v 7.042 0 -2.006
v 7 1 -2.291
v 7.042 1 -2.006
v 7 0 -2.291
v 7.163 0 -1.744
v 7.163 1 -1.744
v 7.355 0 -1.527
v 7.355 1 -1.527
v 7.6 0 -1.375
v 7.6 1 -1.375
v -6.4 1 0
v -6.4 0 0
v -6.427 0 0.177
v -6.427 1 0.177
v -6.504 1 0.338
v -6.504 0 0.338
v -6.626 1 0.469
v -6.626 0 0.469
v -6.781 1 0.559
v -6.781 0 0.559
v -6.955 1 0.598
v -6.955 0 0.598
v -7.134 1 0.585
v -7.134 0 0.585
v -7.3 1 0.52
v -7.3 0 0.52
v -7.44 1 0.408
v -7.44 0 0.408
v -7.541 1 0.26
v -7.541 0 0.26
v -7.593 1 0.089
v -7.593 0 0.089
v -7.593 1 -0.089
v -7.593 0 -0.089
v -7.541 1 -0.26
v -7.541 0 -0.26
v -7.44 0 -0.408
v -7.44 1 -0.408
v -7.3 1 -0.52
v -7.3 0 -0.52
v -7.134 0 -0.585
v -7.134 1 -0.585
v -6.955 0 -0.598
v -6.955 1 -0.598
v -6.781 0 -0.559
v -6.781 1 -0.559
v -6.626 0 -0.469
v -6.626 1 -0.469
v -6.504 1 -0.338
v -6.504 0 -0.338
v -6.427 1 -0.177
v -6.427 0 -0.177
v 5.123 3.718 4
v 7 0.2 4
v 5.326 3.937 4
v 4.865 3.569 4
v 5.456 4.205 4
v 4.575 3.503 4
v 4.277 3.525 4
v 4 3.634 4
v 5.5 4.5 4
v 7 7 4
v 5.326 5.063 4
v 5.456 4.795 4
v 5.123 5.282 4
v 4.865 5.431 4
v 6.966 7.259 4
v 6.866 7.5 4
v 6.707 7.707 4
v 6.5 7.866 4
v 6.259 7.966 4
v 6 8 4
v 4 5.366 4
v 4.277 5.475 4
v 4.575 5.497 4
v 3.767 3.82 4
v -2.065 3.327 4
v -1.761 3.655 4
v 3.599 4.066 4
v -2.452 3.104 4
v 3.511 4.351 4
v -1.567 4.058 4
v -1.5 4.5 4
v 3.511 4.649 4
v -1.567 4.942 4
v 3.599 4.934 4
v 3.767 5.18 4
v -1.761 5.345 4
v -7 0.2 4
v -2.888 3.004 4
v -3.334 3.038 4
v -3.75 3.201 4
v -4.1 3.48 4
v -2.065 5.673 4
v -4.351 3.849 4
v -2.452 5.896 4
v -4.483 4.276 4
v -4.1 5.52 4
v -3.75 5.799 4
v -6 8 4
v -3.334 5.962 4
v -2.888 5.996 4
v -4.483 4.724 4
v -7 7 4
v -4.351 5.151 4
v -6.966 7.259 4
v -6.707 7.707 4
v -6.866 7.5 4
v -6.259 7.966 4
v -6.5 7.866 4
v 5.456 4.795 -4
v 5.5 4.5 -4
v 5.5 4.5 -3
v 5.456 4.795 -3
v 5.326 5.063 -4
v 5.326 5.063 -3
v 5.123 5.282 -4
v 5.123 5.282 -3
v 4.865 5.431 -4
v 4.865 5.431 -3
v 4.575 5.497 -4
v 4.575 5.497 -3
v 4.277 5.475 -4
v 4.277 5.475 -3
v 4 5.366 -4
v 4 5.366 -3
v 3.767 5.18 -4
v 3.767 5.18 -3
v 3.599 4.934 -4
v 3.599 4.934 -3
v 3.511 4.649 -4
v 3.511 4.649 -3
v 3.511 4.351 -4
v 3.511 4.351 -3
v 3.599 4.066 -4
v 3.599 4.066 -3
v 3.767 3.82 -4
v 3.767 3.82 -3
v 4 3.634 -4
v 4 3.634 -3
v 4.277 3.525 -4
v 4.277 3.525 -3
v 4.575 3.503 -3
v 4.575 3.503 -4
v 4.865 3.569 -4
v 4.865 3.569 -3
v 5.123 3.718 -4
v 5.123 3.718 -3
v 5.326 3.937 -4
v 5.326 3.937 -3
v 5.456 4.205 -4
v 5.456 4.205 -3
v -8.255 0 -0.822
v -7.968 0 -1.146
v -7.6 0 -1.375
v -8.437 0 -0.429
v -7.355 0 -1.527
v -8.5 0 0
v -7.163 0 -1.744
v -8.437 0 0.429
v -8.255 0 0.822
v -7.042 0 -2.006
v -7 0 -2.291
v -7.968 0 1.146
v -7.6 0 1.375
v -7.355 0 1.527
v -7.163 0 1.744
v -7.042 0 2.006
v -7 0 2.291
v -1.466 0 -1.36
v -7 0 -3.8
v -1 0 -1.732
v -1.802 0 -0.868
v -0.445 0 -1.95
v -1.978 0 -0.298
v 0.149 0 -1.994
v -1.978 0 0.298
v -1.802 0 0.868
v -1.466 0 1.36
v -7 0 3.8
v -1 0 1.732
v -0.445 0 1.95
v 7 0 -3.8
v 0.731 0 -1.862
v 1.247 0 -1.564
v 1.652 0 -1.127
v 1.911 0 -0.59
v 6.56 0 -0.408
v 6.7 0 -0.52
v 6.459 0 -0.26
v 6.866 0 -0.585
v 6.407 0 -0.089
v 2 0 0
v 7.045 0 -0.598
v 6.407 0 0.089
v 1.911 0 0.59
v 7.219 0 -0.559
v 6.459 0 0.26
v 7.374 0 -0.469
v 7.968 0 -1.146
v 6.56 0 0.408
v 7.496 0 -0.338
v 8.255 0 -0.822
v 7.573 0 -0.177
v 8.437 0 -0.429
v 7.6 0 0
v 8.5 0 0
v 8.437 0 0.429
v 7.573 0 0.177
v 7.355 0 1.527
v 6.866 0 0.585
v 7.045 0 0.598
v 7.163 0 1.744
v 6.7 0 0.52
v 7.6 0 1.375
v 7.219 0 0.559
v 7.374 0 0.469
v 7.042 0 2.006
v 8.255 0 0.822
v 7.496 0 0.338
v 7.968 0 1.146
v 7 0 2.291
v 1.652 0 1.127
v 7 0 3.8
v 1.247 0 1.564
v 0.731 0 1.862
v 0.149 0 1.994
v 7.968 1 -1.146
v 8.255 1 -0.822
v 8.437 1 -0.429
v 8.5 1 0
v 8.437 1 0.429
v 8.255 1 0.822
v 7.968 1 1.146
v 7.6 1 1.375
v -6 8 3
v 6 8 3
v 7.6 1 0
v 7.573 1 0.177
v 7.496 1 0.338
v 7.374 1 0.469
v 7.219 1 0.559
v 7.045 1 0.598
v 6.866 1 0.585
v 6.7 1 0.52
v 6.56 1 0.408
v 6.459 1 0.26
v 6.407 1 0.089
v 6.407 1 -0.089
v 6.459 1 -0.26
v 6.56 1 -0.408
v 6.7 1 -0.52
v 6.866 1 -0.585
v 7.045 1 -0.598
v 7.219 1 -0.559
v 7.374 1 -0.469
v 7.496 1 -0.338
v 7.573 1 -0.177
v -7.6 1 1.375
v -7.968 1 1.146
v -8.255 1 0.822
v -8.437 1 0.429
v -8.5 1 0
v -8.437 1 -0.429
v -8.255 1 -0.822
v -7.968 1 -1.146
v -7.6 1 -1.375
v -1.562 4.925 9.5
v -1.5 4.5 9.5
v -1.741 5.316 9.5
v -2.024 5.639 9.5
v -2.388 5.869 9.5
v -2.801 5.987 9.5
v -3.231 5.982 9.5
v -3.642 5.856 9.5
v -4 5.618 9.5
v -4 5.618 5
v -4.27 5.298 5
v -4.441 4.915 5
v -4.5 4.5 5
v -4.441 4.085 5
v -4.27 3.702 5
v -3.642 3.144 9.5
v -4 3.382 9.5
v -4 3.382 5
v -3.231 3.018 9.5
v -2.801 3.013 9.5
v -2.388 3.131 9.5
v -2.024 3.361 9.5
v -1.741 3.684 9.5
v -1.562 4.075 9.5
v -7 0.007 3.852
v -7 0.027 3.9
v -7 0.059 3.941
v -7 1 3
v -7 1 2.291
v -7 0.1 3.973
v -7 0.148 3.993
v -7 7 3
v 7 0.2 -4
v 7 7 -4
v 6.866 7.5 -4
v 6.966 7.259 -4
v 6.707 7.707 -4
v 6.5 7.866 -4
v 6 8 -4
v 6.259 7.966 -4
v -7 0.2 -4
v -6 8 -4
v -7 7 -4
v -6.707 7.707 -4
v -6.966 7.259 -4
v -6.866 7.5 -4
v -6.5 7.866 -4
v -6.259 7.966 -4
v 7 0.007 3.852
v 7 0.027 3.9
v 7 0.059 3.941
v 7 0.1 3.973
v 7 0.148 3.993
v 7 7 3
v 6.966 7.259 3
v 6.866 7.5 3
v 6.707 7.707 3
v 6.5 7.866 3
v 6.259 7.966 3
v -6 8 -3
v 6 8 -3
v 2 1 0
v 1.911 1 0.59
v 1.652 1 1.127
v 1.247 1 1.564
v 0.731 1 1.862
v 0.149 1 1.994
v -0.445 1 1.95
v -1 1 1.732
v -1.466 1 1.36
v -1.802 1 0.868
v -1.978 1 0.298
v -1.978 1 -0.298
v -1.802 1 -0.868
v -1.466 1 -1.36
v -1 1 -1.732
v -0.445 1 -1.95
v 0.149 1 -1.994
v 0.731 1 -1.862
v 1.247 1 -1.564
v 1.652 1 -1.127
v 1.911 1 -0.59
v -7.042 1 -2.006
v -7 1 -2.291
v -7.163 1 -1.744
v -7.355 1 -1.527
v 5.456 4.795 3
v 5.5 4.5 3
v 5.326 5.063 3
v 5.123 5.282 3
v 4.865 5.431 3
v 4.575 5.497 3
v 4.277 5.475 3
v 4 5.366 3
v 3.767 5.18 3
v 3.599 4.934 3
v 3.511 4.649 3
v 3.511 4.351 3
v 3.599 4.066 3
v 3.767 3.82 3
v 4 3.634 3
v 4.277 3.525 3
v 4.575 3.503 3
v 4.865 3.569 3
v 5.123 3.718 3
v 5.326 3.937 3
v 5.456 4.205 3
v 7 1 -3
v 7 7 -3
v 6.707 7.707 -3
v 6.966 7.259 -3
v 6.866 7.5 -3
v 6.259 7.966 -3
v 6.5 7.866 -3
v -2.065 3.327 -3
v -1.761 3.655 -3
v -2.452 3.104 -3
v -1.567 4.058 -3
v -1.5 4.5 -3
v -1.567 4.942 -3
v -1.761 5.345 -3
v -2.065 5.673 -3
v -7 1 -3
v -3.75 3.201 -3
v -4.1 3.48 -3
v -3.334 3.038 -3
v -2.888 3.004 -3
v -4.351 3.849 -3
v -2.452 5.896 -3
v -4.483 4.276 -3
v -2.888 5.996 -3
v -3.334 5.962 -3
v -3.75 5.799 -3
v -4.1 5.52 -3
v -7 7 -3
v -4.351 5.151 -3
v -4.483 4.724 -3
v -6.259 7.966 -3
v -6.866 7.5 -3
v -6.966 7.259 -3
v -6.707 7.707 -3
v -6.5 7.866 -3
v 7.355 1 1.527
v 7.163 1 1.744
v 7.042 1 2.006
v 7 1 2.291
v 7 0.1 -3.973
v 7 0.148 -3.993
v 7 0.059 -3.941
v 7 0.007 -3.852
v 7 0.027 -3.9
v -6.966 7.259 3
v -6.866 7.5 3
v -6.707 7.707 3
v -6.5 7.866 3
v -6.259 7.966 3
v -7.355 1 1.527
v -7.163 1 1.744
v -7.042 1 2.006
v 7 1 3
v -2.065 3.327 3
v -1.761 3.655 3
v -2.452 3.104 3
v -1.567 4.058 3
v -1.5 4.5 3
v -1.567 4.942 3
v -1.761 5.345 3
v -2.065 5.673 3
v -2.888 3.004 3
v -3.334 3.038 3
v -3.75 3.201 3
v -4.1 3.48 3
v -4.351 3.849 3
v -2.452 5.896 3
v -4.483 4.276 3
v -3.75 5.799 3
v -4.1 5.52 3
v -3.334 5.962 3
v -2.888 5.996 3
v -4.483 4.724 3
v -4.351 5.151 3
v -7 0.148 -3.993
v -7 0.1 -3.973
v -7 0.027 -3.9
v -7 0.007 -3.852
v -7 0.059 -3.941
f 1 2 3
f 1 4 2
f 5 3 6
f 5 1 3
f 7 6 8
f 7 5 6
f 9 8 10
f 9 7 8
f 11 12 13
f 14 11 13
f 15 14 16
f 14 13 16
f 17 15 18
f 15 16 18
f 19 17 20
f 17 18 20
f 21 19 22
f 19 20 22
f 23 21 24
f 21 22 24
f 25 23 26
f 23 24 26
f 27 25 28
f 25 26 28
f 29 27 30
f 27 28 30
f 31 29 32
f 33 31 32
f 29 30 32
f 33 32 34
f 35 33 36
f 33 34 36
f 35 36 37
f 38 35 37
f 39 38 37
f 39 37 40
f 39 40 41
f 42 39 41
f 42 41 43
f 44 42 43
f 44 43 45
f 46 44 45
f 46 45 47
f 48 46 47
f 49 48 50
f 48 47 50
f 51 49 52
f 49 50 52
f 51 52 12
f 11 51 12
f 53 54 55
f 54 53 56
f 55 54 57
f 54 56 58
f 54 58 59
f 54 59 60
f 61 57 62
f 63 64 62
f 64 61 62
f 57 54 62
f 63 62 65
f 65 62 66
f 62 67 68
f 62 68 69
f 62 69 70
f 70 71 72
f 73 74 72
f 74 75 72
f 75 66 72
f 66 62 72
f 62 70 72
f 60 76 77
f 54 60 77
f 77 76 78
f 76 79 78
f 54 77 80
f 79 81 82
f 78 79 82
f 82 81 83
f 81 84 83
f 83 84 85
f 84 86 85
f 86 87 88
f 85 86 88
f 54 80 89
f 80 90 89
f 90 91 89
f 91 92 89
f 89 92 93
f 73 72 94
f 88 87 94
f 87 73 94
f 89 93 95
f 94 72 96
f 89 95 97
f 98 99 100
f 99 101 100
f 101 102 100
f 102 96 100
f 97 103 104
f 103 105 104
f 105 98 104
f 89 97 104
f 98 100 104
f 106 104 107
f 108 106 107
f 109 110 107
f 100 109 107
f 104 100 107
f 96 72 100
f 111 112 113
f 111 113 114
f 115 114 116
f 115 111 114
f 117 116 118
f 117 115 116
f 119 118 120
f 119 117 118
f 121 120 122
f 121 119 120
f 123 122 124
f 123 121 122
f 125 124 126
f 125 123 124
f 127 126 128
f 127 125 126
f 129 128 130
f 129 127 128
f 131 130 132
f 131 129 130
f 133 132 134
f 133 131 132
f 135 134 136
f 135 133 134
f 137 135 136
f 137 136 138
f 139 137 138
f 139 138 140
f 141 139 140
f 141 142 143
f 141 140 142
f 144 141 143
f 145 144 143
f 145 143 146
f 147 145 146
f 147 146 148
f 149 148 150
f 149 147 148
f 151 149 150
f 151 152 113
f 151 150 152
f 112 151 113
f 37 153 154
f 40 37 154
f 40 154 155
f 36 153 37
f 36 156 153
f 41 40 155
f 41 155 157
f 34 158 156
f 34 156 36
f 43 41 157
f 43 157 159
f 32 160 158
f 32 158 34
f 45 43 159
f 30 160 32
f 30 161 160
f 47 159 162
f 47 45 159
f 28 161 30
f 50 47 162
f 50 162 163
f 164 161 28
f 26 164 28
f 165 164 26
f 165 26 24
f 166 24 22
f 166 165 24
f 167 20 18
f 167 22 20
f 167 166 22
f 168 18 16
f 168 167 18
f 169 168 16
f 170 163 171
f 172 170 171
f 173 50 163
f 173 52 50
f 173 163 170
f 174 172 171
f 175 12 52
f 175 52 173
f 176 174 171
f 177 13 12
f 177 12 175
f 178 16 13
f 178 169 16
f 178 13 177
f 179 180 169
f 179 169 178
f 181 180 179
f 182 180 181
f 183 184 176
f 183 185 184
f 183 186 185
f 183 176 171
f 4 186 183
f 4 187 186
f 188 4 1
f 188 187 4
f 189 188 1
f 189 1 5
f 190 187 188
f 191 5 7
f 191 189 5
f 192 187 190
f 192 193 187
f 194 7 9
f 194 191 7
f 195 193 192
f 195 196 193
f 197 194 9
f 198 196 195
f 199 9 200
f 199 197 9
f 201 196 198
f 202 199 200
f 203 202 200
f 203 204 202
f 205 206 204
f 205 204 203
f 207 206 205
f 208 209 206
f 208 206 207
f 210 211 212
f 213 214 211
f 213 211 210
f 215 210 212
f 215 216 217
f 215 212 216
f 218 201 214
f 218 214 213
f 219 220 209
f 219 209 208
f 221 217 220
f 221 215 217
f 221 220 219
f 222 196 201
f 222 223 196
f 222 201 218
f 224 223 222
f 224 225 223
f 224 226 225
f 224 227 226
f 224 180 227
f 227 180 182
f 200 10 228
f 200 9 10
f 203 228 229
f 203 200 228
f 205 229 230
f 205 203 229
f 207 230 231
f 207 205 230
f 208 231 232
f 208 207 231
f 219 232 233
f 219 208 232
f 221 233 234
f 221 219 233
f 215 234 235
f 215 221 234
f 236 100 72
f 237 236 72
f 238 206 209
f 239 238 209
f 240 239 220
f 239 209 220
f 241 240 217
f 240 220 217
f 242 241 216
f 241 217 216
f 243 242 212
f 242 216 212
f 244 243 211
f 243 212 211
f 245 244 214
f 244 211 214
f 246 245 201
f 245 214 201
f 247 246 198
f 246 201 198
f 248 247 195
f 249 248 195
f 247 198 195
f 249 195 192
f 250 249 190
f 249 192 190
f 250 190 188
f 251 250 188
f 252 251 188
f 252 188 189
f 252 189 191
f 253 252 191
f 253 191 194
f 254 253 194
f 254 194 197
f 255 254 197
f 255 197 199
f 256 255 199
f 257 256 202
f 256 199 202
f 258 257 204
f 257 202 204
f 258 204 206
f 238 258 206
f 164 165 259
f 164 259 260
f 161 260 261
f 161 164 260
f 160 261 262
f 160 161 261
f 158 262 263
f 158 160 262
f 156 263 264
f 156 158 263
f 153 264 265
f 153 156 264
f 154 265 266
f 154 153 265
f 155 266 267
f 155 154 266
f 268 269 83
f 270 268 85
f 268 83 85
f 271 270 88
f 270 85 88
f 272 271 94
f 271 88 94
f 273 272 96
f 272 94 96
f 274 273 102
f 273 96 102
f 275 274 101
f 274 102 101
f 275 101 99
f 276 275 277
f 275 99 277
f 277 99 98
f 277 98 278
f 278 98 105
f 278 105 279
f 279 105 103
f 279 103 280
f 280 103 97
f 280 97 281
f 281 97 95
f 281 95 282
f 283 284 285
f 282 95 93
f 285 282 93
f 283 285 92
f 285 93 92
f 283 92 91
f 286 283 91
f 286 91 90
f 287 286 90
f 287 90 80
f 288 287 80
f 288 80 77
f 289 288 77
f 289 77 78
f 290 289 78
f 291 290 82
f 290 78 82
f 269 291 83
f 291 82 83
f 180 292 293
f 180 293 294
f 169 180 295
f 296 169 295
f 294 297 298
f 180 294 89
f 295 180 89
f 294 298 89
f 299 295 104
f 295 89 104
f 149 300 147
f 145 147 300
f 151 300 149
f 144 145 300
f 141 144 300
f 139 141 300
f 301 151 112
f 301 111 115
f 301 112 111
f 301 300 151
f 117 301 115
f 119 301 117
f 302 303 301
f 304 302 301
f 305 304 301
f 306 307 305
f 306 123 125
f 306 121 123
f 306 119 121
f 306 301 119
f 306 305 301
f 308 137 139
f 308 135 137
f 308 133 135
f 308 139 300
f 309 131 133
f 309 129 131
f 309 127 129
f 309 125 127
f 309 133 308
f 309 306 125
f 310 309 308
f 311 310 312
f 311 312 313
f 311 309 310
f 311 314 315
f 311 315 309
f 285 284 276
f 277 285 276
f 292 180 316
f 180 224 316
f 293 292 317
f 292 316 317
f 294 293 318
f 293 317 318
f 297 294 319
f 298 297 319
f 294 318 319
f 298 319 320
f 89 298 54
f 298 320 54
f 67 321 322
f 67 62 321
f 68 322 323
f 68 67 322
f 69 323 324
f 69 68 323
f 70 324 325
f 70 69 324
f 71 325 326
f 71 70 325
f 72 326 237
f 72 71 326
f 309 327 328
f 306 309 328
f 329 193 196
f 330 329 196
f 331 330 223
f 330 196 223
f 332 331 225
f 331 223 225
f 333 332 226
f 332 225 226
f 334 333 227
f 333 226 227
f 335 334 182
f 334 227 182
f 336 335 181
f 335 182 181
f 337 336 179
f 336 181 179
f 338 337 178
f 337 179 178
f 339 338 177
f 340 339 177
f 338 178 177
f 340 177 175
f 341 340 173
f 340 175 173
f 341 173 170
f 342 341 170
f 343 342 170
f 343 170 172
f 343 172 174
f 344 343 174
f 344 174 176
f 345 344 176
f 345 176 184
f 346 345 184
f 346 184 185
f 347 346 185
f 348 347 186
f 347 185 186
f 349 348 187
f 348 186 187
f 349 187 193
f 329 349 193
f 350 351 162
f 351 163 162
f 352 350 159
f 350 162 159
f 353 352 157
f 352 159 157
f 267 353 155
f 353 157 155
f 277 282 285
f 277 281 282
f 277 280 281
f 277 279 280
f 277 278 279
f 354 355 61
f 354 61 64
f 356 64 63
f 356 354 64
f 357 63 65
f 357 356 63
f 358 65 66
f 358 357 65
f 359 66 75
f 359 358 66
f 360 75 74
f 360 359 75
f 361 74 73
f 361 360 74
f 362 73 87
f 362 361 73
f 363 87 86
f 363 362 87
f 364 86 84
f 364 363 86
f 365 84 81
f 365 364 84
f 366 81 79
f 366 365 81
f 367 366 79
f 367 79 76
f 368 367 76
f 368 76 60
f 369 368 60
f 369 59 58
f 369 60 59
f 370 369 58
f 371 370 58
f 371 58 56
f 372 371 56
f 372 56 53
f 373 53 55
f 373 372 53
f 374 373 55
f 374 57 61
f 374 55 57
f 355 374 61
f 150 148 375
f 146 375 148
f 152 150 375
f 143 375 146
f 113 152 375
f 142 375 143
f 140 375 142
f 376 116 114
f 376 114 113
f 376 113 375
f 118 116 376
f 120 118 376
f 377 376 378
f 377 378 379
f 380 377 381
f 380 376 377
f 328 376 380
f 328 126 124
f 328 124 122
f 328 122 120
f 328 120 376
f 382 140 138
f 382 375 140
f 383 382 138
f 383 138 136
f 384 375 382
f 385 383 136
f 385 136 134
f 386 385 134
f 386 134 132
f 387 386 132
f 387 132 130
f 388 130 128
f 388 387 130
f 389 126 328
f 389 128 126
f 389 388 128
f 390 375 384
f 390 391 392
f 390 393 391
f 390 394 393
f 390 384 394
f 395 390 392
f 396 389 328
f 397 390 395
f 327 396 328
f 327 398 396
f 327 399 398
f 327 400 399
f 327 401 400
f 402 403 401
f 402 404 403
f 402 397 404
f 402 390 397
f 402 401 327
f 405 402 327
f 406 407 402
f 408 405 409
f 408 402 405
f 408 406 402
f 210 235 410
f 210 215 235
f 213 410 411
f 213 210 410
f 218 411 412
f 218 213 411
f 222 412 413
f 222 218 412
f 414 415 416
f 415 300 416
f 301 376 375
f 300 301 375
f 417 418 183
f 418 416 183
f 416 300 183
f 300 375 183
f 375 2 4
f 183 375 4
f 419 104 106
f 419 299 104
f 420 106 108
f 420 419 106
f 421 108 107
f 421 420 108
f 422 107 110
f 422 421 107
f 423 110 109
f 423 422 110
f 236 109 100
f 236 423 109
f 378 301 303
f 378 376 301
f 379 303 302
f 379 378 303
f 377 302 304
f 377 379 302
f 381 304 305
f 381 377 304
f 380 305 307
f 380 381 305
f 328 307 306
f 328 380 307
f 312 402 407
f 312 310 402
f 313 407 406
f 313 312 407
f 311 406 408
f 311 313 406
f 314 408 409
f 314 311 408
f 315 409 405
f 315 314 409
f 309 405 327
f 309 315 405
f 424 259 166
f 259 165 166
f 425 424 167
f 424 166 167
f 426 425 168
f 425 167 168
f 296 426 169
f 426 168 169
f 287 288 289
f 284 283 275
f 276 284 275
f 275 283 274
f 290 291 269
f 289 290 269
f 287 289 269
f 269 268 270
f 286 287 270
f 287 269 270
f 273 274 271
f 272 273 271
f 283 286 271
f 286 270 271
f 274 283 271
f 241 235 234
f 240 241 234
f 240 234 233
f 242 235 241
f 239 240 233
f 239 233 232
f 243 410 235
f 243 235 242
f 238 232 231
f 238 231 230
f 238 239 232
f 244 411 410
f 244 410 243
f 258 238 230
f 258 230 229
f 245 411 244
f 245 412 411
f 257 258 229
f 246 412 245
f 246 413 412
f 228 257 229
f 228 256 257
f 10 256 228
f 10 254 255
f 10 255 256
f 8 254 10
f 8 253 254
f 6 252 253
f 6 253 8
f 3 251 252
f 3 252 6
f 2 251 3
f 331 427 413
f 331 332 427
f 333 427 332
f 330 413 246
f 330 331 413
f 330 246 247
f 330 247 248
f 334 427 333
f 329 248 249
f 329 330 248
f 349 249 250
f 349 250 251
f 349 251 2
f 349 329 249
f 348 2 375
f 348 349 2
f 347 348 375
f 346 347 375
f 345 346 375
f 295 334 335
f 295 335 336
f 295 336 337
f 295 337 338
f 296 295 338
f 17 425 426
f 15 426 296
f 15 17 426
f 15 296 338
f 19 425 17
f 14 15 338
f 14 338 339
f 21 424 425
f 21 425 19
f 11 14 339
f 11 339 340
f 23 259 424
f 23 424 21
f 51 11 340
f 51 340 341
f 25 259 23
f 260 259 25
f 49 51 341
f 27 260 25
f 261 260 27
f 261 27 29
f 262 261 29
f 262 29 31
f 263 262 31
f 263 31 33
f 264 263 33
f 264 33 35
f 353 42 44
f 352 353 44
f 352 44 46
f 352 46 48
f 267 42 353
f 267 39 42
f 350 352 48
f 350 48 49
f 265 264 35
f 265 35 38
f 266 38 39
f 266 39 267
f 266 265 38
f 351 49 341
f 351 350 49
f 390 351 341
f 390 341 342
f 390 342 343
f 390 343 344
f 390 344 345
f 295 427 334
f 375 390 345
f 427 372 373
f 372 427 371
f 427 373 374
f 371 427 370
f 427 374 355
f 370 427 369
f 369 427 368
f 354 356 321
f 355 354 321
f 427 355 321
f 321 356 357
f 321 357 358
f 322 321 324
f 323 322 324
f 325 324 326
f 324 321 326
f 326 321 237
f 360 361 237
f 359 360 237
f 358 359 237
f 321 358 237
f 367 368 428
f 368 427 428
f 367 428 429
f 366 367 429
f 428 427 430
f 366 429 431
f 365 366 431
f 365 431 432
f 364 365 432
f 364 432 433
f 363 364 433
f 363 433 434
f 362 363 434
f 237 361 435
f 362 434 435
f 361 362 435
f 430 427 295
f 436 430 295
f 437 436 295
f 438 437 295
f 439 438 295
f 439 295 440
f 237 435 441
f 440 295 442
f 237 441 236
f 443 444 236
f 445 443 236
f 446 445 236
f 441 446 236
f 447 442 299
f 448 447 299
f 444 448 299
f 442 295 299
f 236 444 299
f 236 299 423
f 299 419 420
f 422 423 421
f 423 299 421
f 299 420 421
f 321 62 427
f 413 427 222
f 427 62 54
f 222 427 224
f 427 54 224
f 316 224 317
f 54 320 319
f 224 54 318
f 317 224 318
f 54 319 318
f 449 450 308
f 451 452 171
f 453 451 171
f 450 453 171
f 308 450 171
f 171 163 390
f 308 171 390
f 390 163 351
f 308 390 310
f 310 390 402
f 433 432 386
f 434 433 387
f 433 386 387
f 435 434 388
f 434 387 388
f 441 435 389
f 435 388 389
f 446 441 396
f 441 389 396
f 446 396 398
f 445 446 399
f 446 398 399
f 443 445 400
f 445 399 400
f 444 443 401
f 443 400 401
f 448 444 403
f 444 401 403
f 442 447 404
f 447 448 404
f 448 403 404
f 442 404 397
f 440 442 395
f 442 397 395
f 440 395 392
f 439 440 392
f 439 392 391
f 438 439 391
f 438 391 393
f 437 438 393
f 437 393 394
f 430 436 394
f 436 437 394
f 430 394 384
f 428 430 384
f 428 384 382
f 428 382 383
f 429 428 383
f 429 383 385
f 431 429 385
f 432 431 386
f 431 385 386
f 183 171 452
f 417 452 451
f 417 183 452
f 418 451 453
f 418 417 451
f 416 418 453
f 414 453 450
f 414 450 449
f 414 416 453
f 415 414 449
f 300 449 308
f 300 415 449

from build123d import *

# Parameters (mm, degrees)
EXTRUDE1_DEPTH      = 4
EXTRUDE2_DEPTH      = 12.357816692
EXTRUDE2_DEPTH_BACK = 12.357816692
SKETCH2_R           = 1
EXTRUDE3_DEPTH      = 12.357816692
EXTRUDE3_DEPTH_BACK = 12.357816692
SKETCH4_W           = 6
SKETCH4_H           = 8.732029078
FILLET1_R           = 0.2
FILLET2_R           = 1
EXTRUDE4_DEPTH      = 14
EXTRUDE4_DEPTH_BACK = 3
SKETCH3_R           = 1.5
EXTRUDE5_DEPTH      = 9
SKETCH6_R           = 1.5
EXTRUDE6_DEPTH      = 1
SKETCH7_R           = 0.6
EXTRUDE7_DEPTH      = 1
FILLET3_R           = 1
SKETCH8_R           = 2
EXTRUDE8_DEPTH      = 1
SKETCH9_W           = 5.922368331
SKETCH9_H           = 2.817570744
SKETCH9_H_2         = 4.117351233
EXTRUDE9_DEPTH      = 19.227726134


with BuildPart() as part:
    # Sketch1 → Extrude1 (new, symmetric)
    with BuildSketch(Plane.XY):
        Polygon((0, 0), (-7, 0), (-7, 8), (7, 8), (7, 0), align=None)
    extrude(amount=EXTRUDE1_DEPTH, both=True)

    # Sketch2 → Extrude2 (cut, two sides: drawn at the far end of the back side and taken through both)
    with BuildSketch(Plane.XY.offset(-EXTRUDE2_DEPTH_BACK)):
        with Locations((4.5, 4.5)):
            Circle(SKETCH2_R)
    extrude(amount=EXTRUDE2_DEPTH + EXTRUDE2_DEPTH_BACK, mode=Mode.SUBTRACT)

    # Sketch4 → Extrude3 (cut, two sides: drawn at the far end of the back side and taken through both)
    with BuildSketch(Plane(origin=(0, 0, 0), x_dir=(0, 0, -1), z_dir=(1, 0, 0)).offset(-EXTRUDE3_DEPTH_BACK)):
        with Locations((0, 5.366014539)):
            Rectangle(SKETCH4_W, SKETCH4_H)
    extrude(amount=EXTRUDE3_DEPTH + EXTRUDE3_DEPTH_BACK, mode=Mode.SUBTRACT)

    # Fillet1
    fillet1_edges = [part.edges().sort_by_distance(p)[0] for p in [
        (0, 0, 4),
        (0, 0, -4),
    ]]
    fillet(fillet1_edges, radius=FILLET1_R)

    # Fillet2
    fillet2_edges = [part.edges().sort_by_distance(p)[0] for p in [
        (-7, 8, -3.5),
        (7, 8, -3.5),
        (-7, 8, 3.5),
        (7, 8, 3.5),
    ]]
    fillet(fillet2_edges, radius=FILLET2_R)

    # Sketch3 → Extrude4 (add, two sides: drawn at the far end of the back side and taken through both)
    with BuildSketch(Plane.XY.offset(-EXTRUDE4_DEPTH_BACK)):
        with Locations((-3, 4.5)):
            Circle(SKETCH3_R)
    extrude(amount=EXTRUDE4_DEPTH + EXTRUDE4_DEPTH_BACK)

    # Sketch5 → Extrude5 (cut)
    with BuildSketch(Plane.XY.offset(14)):
        Polygon((-4, 4.5), (-4, 6.060686456), (-4.95644391, 6.060686456), (-4.95644391, 2.5), (-4, 2.5), align=None)
    extrude(amount=-EXTRUDE5_DEPTH, mode=Mode.SUBTRACT)

    # Sketch6 → Extrude6 (add)
    with BuildSketch(Plane.XZ):
        with Locations((-7, 0)):
            Circle(SKETCH6_R)
        with Locations((7, 0)):
            Circle(SKETCH6_R)
    extrude(amount=-EXTRUDE6_DEPTH)

    # Sketch7 → Extrude7 (cut)
    with BuildSketch(Plane.XZ):
        with Locations((-7, 0)):
            Circle(SKETCH7_R)
        with Locations((7, 0)):
            Circle(SKETCH7_R)
    extrude(amount=-EXTRUDE7_DEPTH, mode=Mode.SUBTRACT)

    # Fillet3
    fillet3_edges = [part.edges().sort_by_distance(p)[0] for p in [
        (7, 0.5, -1.5),
        (7, 0.5, 1.5),
        (-7, 0.5, 1.5),
        (-7, 0.5, -1.5),
    ]]
    fillet(fillet3_edges, radius=FILLET3_R)

    # Sketch8 → Extrude8 (cut)
    with BuildSketch(Plane.XZ):
        Circle(SKETCH8_R)
    extrude(amount=-EXTRUDE8_DEPTH, mode=Mode.SUBTRACT)

    # Sketch9 → Extrude9 (cut, through all)
    with BuildSketch(Plane(origin=(0, 0, 0), x_dir=(0, 0, -1), z_dir=(1, 0, 0))):
        with Locations((-12.461184166, 5.908785372)):
            Rectangle(SKETCH9_W, SKETCH9_H)
        with Locations((-12.461184166, 2.441324384)):
            Rectangle(SKETCH9_W, SKETCH9_H_2)
    extrude(amount=-EXTRUDE9_DEPTH, mode=Mode.SUBTRACT)


solid = part.part
